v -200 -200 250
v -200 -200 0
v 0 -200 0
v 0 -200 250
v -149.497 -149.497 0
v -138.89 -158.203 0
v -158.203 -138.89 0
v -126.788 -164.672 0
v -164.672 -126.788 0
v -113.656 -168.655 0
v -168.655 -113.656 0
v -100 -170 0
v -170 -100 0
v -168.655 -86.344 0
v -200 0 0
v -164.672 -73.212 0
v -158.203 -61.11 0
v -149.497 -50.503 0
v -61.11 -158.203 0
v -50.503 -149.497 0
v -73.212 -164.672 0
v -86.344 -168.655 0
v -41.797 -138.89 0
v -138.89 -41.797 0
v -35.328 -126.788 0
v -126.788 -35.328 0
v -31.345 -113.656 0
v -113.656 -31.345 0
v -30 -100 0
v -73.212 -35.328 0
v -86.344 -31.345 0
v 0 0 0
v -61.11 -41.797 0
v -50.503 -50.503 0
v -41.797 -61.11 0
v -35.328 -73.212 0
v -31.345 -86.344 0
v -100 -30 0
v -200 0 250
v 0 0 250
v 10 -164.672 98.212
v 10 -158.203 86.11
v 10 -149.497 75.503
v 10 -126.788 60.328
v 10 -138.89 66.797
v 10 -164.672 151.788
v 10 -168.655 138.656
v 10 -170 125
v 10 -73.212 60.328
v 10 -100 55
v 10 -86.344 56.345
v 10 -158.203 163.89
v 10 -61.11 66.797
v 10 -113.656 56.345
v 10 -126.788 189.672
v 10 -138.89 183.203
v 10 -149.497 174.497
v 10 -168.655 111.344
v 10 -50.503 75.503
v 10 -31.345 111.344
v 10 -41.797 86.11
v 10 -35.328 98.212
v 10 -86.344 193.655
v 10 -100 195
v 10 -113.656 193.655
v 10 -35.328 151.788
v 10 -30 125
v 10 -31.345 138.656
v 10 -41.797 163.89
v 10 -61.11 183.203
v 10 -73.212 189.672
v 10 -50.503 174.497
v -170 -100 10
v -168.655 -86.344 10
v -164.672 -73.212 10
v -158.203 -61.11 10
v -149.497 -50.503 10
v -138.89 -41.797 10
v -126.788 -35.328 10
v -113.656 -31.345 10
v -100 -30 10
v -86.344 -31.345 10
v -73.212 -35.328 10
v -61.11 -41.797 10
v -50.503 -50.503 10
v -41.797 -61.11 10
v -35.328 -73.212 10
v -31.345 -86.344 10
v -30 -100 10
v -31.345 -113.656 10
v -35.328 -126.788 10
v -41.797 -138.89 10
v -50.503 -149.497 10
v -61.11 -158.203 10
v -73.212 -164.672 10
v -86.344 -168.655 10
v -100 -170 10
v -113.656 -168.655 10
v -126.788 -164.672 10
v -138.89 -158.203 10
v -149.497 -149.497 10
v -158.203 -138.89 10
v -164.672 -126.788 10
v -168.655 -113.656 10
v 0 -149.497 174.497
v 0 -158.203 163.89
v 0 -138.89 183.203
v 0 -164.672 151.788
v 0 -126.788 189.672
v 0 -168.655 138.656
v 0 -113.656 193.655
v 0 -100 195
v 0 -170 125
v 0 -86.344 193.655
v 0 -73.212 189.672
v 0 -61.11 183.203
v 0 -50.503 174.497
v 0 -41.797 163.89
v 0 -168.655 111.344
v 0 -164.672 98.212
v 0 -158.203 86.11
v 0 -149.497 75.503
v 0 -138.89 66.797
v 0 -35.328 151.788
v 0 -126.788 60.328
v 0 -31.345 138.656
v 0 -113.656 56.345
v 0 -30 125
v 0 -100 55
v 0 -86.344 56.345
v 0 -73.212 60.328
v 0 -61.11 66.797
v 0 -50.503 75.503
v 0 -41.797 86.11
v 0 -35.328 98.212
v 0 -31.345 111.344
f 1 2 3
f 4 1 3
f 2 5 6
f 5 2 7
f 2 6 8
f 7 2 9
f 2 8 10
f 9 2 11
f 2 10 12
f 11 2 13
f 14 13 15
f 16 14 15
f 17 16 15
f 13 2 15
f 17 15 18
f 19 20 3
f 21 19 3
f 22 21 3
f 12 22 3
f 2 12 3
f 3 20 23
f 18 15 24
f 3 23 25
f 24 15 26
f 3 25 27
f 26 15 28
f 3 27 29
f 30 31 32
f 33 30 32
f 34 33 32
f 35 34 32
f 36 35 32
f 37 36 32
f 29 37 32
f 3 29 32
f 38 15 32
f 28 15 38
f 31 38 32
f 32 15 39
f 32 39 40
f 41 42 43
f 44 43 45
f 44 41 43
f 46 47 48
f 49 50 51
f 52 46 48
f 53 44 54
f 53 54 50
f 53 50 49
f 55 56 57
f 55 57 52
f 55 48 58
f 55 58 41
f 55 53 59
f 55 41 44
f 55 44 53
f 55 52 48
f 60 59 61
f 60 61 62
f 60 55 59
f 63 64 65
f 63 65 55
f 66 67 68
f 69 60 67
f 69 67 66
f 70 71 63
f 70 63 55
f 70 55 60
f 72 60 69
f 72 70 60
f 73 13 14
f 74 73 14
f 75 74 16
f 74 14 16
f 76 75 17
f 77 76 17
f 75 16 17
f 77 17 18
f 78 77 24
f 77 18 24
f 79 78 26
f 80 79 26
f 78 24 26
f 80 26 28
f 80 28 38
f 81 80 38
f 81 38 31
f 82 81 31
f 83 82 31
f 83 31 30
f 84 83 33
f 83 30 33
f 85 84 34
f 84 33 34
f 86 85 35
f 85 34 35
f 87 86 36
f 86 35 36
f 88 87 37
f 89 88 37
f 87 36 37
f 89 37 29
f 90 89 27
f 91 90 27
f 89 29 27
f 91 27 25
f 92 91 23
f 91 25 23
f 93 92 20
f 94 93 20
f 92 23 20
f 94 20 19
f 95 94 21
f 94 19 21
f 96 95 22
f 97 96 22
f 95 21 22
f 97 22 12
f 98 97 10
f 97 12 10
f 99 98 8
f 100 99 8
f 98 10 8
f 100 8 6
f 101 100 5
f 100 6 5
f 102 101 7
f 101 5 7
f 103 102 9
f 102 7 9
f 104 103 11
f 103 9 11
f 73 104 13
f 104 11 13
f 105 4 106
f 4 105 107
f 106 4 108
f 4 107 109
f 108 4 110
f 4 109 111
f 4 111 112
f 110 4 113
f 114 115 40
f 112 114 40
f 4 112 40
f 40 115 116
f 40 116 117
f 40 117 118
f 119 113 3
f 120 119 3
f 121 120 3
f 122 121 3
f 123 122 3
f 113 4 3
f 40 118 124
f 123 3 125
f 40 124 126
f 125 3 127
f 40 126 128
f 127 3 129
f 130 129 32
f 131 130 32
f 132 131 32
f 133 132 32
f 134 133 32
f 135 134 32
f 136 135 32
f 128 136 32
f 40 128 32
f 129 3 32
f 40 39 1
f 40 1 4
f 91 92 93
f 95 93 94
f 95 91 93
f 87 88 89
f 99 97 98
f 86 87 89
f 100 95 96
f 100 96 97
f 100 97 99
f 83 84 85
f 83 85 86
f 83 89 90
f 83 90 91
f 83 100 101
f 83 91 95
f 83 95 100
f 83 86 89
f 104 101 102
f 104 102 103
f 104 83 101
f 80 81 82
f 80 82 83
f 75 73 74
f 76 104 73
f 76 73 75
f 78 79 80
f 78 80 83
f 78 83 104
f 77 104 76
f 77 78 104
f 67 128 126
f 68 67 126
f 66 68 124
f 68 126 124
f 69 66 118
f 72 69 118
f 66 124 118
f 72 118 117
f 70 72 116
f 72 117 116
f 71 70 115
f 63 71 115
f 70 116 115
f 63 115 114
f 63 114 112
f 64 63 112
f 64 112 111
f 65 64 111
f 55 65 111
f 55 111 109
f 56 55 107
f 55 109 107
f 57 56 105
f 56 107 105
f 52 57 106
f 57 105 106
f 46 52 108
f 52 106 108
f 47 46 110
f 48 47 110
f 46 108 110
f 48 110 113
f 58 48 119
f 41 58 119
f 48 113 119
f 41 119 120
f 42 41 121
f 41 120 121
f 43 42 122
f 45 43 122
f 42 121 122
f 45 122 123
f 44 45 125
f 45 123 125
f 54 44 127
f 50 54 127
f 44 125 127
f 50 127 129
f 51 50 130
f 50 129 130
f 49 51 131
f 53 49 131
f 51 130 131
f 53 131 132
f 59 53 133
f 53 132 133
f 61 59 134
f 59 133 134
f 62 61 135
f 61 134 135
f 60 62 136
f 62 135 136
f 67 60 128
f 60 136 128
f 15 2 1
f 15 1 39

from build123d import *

# Parameters (mm, degrees)
ESQUISSE1_W             = 200
ESQUISSE1_H             = 200
BOSS_EXTRU_1_DEPTH      = 250
ESQUISSE2_R             = 70
ENL_V_MAT_EXTRU_1_DEPTH = 10
ESQUISSE3_R             = 70
BOSS_EXTRU_2_DEPTH      = 10


with BuildPart() as part:
    # Esquisse1 → Boss.-Extru.1 (new body)
    with BuildSketch(Plane.XY):
        with Locations((-100, -100)):
            Rectangle(ESQUISSE1_W, ESQUISSE1_H)
    extrude(amount=BOSS_EXTRU_1_DEPTH)

    # Esquisse2 → Enlèv. mat.-Extru.1 (cut)
    with BuildSketch(Plane(origin=(0, 0, 0), x_dir=(-1, 0, 0), z_dir=(0, 0, -1))):
        with Locations((100, -100)):
            Circle(ESQUISSE2_R)
    extrude(amount=-ENL_V_MAT_EXTRU_1_DEPTH, mode=Mode.SUBTRACT)

    # Esquisse3 → Boss.-Extru.2 (add)
    with BuildSketch(Plane(origin=(0, 0, 0), x_dir=(0, 0, -1), z_dir=(1, 0, 0))):
        with Locations(Location((-125, -100, 0), (0, 0, 90))):
            Circle(ESQUISSE3_R)
    extrude(amount=BOSS_EXTRU_2_DEPTH)


solid = part.part
